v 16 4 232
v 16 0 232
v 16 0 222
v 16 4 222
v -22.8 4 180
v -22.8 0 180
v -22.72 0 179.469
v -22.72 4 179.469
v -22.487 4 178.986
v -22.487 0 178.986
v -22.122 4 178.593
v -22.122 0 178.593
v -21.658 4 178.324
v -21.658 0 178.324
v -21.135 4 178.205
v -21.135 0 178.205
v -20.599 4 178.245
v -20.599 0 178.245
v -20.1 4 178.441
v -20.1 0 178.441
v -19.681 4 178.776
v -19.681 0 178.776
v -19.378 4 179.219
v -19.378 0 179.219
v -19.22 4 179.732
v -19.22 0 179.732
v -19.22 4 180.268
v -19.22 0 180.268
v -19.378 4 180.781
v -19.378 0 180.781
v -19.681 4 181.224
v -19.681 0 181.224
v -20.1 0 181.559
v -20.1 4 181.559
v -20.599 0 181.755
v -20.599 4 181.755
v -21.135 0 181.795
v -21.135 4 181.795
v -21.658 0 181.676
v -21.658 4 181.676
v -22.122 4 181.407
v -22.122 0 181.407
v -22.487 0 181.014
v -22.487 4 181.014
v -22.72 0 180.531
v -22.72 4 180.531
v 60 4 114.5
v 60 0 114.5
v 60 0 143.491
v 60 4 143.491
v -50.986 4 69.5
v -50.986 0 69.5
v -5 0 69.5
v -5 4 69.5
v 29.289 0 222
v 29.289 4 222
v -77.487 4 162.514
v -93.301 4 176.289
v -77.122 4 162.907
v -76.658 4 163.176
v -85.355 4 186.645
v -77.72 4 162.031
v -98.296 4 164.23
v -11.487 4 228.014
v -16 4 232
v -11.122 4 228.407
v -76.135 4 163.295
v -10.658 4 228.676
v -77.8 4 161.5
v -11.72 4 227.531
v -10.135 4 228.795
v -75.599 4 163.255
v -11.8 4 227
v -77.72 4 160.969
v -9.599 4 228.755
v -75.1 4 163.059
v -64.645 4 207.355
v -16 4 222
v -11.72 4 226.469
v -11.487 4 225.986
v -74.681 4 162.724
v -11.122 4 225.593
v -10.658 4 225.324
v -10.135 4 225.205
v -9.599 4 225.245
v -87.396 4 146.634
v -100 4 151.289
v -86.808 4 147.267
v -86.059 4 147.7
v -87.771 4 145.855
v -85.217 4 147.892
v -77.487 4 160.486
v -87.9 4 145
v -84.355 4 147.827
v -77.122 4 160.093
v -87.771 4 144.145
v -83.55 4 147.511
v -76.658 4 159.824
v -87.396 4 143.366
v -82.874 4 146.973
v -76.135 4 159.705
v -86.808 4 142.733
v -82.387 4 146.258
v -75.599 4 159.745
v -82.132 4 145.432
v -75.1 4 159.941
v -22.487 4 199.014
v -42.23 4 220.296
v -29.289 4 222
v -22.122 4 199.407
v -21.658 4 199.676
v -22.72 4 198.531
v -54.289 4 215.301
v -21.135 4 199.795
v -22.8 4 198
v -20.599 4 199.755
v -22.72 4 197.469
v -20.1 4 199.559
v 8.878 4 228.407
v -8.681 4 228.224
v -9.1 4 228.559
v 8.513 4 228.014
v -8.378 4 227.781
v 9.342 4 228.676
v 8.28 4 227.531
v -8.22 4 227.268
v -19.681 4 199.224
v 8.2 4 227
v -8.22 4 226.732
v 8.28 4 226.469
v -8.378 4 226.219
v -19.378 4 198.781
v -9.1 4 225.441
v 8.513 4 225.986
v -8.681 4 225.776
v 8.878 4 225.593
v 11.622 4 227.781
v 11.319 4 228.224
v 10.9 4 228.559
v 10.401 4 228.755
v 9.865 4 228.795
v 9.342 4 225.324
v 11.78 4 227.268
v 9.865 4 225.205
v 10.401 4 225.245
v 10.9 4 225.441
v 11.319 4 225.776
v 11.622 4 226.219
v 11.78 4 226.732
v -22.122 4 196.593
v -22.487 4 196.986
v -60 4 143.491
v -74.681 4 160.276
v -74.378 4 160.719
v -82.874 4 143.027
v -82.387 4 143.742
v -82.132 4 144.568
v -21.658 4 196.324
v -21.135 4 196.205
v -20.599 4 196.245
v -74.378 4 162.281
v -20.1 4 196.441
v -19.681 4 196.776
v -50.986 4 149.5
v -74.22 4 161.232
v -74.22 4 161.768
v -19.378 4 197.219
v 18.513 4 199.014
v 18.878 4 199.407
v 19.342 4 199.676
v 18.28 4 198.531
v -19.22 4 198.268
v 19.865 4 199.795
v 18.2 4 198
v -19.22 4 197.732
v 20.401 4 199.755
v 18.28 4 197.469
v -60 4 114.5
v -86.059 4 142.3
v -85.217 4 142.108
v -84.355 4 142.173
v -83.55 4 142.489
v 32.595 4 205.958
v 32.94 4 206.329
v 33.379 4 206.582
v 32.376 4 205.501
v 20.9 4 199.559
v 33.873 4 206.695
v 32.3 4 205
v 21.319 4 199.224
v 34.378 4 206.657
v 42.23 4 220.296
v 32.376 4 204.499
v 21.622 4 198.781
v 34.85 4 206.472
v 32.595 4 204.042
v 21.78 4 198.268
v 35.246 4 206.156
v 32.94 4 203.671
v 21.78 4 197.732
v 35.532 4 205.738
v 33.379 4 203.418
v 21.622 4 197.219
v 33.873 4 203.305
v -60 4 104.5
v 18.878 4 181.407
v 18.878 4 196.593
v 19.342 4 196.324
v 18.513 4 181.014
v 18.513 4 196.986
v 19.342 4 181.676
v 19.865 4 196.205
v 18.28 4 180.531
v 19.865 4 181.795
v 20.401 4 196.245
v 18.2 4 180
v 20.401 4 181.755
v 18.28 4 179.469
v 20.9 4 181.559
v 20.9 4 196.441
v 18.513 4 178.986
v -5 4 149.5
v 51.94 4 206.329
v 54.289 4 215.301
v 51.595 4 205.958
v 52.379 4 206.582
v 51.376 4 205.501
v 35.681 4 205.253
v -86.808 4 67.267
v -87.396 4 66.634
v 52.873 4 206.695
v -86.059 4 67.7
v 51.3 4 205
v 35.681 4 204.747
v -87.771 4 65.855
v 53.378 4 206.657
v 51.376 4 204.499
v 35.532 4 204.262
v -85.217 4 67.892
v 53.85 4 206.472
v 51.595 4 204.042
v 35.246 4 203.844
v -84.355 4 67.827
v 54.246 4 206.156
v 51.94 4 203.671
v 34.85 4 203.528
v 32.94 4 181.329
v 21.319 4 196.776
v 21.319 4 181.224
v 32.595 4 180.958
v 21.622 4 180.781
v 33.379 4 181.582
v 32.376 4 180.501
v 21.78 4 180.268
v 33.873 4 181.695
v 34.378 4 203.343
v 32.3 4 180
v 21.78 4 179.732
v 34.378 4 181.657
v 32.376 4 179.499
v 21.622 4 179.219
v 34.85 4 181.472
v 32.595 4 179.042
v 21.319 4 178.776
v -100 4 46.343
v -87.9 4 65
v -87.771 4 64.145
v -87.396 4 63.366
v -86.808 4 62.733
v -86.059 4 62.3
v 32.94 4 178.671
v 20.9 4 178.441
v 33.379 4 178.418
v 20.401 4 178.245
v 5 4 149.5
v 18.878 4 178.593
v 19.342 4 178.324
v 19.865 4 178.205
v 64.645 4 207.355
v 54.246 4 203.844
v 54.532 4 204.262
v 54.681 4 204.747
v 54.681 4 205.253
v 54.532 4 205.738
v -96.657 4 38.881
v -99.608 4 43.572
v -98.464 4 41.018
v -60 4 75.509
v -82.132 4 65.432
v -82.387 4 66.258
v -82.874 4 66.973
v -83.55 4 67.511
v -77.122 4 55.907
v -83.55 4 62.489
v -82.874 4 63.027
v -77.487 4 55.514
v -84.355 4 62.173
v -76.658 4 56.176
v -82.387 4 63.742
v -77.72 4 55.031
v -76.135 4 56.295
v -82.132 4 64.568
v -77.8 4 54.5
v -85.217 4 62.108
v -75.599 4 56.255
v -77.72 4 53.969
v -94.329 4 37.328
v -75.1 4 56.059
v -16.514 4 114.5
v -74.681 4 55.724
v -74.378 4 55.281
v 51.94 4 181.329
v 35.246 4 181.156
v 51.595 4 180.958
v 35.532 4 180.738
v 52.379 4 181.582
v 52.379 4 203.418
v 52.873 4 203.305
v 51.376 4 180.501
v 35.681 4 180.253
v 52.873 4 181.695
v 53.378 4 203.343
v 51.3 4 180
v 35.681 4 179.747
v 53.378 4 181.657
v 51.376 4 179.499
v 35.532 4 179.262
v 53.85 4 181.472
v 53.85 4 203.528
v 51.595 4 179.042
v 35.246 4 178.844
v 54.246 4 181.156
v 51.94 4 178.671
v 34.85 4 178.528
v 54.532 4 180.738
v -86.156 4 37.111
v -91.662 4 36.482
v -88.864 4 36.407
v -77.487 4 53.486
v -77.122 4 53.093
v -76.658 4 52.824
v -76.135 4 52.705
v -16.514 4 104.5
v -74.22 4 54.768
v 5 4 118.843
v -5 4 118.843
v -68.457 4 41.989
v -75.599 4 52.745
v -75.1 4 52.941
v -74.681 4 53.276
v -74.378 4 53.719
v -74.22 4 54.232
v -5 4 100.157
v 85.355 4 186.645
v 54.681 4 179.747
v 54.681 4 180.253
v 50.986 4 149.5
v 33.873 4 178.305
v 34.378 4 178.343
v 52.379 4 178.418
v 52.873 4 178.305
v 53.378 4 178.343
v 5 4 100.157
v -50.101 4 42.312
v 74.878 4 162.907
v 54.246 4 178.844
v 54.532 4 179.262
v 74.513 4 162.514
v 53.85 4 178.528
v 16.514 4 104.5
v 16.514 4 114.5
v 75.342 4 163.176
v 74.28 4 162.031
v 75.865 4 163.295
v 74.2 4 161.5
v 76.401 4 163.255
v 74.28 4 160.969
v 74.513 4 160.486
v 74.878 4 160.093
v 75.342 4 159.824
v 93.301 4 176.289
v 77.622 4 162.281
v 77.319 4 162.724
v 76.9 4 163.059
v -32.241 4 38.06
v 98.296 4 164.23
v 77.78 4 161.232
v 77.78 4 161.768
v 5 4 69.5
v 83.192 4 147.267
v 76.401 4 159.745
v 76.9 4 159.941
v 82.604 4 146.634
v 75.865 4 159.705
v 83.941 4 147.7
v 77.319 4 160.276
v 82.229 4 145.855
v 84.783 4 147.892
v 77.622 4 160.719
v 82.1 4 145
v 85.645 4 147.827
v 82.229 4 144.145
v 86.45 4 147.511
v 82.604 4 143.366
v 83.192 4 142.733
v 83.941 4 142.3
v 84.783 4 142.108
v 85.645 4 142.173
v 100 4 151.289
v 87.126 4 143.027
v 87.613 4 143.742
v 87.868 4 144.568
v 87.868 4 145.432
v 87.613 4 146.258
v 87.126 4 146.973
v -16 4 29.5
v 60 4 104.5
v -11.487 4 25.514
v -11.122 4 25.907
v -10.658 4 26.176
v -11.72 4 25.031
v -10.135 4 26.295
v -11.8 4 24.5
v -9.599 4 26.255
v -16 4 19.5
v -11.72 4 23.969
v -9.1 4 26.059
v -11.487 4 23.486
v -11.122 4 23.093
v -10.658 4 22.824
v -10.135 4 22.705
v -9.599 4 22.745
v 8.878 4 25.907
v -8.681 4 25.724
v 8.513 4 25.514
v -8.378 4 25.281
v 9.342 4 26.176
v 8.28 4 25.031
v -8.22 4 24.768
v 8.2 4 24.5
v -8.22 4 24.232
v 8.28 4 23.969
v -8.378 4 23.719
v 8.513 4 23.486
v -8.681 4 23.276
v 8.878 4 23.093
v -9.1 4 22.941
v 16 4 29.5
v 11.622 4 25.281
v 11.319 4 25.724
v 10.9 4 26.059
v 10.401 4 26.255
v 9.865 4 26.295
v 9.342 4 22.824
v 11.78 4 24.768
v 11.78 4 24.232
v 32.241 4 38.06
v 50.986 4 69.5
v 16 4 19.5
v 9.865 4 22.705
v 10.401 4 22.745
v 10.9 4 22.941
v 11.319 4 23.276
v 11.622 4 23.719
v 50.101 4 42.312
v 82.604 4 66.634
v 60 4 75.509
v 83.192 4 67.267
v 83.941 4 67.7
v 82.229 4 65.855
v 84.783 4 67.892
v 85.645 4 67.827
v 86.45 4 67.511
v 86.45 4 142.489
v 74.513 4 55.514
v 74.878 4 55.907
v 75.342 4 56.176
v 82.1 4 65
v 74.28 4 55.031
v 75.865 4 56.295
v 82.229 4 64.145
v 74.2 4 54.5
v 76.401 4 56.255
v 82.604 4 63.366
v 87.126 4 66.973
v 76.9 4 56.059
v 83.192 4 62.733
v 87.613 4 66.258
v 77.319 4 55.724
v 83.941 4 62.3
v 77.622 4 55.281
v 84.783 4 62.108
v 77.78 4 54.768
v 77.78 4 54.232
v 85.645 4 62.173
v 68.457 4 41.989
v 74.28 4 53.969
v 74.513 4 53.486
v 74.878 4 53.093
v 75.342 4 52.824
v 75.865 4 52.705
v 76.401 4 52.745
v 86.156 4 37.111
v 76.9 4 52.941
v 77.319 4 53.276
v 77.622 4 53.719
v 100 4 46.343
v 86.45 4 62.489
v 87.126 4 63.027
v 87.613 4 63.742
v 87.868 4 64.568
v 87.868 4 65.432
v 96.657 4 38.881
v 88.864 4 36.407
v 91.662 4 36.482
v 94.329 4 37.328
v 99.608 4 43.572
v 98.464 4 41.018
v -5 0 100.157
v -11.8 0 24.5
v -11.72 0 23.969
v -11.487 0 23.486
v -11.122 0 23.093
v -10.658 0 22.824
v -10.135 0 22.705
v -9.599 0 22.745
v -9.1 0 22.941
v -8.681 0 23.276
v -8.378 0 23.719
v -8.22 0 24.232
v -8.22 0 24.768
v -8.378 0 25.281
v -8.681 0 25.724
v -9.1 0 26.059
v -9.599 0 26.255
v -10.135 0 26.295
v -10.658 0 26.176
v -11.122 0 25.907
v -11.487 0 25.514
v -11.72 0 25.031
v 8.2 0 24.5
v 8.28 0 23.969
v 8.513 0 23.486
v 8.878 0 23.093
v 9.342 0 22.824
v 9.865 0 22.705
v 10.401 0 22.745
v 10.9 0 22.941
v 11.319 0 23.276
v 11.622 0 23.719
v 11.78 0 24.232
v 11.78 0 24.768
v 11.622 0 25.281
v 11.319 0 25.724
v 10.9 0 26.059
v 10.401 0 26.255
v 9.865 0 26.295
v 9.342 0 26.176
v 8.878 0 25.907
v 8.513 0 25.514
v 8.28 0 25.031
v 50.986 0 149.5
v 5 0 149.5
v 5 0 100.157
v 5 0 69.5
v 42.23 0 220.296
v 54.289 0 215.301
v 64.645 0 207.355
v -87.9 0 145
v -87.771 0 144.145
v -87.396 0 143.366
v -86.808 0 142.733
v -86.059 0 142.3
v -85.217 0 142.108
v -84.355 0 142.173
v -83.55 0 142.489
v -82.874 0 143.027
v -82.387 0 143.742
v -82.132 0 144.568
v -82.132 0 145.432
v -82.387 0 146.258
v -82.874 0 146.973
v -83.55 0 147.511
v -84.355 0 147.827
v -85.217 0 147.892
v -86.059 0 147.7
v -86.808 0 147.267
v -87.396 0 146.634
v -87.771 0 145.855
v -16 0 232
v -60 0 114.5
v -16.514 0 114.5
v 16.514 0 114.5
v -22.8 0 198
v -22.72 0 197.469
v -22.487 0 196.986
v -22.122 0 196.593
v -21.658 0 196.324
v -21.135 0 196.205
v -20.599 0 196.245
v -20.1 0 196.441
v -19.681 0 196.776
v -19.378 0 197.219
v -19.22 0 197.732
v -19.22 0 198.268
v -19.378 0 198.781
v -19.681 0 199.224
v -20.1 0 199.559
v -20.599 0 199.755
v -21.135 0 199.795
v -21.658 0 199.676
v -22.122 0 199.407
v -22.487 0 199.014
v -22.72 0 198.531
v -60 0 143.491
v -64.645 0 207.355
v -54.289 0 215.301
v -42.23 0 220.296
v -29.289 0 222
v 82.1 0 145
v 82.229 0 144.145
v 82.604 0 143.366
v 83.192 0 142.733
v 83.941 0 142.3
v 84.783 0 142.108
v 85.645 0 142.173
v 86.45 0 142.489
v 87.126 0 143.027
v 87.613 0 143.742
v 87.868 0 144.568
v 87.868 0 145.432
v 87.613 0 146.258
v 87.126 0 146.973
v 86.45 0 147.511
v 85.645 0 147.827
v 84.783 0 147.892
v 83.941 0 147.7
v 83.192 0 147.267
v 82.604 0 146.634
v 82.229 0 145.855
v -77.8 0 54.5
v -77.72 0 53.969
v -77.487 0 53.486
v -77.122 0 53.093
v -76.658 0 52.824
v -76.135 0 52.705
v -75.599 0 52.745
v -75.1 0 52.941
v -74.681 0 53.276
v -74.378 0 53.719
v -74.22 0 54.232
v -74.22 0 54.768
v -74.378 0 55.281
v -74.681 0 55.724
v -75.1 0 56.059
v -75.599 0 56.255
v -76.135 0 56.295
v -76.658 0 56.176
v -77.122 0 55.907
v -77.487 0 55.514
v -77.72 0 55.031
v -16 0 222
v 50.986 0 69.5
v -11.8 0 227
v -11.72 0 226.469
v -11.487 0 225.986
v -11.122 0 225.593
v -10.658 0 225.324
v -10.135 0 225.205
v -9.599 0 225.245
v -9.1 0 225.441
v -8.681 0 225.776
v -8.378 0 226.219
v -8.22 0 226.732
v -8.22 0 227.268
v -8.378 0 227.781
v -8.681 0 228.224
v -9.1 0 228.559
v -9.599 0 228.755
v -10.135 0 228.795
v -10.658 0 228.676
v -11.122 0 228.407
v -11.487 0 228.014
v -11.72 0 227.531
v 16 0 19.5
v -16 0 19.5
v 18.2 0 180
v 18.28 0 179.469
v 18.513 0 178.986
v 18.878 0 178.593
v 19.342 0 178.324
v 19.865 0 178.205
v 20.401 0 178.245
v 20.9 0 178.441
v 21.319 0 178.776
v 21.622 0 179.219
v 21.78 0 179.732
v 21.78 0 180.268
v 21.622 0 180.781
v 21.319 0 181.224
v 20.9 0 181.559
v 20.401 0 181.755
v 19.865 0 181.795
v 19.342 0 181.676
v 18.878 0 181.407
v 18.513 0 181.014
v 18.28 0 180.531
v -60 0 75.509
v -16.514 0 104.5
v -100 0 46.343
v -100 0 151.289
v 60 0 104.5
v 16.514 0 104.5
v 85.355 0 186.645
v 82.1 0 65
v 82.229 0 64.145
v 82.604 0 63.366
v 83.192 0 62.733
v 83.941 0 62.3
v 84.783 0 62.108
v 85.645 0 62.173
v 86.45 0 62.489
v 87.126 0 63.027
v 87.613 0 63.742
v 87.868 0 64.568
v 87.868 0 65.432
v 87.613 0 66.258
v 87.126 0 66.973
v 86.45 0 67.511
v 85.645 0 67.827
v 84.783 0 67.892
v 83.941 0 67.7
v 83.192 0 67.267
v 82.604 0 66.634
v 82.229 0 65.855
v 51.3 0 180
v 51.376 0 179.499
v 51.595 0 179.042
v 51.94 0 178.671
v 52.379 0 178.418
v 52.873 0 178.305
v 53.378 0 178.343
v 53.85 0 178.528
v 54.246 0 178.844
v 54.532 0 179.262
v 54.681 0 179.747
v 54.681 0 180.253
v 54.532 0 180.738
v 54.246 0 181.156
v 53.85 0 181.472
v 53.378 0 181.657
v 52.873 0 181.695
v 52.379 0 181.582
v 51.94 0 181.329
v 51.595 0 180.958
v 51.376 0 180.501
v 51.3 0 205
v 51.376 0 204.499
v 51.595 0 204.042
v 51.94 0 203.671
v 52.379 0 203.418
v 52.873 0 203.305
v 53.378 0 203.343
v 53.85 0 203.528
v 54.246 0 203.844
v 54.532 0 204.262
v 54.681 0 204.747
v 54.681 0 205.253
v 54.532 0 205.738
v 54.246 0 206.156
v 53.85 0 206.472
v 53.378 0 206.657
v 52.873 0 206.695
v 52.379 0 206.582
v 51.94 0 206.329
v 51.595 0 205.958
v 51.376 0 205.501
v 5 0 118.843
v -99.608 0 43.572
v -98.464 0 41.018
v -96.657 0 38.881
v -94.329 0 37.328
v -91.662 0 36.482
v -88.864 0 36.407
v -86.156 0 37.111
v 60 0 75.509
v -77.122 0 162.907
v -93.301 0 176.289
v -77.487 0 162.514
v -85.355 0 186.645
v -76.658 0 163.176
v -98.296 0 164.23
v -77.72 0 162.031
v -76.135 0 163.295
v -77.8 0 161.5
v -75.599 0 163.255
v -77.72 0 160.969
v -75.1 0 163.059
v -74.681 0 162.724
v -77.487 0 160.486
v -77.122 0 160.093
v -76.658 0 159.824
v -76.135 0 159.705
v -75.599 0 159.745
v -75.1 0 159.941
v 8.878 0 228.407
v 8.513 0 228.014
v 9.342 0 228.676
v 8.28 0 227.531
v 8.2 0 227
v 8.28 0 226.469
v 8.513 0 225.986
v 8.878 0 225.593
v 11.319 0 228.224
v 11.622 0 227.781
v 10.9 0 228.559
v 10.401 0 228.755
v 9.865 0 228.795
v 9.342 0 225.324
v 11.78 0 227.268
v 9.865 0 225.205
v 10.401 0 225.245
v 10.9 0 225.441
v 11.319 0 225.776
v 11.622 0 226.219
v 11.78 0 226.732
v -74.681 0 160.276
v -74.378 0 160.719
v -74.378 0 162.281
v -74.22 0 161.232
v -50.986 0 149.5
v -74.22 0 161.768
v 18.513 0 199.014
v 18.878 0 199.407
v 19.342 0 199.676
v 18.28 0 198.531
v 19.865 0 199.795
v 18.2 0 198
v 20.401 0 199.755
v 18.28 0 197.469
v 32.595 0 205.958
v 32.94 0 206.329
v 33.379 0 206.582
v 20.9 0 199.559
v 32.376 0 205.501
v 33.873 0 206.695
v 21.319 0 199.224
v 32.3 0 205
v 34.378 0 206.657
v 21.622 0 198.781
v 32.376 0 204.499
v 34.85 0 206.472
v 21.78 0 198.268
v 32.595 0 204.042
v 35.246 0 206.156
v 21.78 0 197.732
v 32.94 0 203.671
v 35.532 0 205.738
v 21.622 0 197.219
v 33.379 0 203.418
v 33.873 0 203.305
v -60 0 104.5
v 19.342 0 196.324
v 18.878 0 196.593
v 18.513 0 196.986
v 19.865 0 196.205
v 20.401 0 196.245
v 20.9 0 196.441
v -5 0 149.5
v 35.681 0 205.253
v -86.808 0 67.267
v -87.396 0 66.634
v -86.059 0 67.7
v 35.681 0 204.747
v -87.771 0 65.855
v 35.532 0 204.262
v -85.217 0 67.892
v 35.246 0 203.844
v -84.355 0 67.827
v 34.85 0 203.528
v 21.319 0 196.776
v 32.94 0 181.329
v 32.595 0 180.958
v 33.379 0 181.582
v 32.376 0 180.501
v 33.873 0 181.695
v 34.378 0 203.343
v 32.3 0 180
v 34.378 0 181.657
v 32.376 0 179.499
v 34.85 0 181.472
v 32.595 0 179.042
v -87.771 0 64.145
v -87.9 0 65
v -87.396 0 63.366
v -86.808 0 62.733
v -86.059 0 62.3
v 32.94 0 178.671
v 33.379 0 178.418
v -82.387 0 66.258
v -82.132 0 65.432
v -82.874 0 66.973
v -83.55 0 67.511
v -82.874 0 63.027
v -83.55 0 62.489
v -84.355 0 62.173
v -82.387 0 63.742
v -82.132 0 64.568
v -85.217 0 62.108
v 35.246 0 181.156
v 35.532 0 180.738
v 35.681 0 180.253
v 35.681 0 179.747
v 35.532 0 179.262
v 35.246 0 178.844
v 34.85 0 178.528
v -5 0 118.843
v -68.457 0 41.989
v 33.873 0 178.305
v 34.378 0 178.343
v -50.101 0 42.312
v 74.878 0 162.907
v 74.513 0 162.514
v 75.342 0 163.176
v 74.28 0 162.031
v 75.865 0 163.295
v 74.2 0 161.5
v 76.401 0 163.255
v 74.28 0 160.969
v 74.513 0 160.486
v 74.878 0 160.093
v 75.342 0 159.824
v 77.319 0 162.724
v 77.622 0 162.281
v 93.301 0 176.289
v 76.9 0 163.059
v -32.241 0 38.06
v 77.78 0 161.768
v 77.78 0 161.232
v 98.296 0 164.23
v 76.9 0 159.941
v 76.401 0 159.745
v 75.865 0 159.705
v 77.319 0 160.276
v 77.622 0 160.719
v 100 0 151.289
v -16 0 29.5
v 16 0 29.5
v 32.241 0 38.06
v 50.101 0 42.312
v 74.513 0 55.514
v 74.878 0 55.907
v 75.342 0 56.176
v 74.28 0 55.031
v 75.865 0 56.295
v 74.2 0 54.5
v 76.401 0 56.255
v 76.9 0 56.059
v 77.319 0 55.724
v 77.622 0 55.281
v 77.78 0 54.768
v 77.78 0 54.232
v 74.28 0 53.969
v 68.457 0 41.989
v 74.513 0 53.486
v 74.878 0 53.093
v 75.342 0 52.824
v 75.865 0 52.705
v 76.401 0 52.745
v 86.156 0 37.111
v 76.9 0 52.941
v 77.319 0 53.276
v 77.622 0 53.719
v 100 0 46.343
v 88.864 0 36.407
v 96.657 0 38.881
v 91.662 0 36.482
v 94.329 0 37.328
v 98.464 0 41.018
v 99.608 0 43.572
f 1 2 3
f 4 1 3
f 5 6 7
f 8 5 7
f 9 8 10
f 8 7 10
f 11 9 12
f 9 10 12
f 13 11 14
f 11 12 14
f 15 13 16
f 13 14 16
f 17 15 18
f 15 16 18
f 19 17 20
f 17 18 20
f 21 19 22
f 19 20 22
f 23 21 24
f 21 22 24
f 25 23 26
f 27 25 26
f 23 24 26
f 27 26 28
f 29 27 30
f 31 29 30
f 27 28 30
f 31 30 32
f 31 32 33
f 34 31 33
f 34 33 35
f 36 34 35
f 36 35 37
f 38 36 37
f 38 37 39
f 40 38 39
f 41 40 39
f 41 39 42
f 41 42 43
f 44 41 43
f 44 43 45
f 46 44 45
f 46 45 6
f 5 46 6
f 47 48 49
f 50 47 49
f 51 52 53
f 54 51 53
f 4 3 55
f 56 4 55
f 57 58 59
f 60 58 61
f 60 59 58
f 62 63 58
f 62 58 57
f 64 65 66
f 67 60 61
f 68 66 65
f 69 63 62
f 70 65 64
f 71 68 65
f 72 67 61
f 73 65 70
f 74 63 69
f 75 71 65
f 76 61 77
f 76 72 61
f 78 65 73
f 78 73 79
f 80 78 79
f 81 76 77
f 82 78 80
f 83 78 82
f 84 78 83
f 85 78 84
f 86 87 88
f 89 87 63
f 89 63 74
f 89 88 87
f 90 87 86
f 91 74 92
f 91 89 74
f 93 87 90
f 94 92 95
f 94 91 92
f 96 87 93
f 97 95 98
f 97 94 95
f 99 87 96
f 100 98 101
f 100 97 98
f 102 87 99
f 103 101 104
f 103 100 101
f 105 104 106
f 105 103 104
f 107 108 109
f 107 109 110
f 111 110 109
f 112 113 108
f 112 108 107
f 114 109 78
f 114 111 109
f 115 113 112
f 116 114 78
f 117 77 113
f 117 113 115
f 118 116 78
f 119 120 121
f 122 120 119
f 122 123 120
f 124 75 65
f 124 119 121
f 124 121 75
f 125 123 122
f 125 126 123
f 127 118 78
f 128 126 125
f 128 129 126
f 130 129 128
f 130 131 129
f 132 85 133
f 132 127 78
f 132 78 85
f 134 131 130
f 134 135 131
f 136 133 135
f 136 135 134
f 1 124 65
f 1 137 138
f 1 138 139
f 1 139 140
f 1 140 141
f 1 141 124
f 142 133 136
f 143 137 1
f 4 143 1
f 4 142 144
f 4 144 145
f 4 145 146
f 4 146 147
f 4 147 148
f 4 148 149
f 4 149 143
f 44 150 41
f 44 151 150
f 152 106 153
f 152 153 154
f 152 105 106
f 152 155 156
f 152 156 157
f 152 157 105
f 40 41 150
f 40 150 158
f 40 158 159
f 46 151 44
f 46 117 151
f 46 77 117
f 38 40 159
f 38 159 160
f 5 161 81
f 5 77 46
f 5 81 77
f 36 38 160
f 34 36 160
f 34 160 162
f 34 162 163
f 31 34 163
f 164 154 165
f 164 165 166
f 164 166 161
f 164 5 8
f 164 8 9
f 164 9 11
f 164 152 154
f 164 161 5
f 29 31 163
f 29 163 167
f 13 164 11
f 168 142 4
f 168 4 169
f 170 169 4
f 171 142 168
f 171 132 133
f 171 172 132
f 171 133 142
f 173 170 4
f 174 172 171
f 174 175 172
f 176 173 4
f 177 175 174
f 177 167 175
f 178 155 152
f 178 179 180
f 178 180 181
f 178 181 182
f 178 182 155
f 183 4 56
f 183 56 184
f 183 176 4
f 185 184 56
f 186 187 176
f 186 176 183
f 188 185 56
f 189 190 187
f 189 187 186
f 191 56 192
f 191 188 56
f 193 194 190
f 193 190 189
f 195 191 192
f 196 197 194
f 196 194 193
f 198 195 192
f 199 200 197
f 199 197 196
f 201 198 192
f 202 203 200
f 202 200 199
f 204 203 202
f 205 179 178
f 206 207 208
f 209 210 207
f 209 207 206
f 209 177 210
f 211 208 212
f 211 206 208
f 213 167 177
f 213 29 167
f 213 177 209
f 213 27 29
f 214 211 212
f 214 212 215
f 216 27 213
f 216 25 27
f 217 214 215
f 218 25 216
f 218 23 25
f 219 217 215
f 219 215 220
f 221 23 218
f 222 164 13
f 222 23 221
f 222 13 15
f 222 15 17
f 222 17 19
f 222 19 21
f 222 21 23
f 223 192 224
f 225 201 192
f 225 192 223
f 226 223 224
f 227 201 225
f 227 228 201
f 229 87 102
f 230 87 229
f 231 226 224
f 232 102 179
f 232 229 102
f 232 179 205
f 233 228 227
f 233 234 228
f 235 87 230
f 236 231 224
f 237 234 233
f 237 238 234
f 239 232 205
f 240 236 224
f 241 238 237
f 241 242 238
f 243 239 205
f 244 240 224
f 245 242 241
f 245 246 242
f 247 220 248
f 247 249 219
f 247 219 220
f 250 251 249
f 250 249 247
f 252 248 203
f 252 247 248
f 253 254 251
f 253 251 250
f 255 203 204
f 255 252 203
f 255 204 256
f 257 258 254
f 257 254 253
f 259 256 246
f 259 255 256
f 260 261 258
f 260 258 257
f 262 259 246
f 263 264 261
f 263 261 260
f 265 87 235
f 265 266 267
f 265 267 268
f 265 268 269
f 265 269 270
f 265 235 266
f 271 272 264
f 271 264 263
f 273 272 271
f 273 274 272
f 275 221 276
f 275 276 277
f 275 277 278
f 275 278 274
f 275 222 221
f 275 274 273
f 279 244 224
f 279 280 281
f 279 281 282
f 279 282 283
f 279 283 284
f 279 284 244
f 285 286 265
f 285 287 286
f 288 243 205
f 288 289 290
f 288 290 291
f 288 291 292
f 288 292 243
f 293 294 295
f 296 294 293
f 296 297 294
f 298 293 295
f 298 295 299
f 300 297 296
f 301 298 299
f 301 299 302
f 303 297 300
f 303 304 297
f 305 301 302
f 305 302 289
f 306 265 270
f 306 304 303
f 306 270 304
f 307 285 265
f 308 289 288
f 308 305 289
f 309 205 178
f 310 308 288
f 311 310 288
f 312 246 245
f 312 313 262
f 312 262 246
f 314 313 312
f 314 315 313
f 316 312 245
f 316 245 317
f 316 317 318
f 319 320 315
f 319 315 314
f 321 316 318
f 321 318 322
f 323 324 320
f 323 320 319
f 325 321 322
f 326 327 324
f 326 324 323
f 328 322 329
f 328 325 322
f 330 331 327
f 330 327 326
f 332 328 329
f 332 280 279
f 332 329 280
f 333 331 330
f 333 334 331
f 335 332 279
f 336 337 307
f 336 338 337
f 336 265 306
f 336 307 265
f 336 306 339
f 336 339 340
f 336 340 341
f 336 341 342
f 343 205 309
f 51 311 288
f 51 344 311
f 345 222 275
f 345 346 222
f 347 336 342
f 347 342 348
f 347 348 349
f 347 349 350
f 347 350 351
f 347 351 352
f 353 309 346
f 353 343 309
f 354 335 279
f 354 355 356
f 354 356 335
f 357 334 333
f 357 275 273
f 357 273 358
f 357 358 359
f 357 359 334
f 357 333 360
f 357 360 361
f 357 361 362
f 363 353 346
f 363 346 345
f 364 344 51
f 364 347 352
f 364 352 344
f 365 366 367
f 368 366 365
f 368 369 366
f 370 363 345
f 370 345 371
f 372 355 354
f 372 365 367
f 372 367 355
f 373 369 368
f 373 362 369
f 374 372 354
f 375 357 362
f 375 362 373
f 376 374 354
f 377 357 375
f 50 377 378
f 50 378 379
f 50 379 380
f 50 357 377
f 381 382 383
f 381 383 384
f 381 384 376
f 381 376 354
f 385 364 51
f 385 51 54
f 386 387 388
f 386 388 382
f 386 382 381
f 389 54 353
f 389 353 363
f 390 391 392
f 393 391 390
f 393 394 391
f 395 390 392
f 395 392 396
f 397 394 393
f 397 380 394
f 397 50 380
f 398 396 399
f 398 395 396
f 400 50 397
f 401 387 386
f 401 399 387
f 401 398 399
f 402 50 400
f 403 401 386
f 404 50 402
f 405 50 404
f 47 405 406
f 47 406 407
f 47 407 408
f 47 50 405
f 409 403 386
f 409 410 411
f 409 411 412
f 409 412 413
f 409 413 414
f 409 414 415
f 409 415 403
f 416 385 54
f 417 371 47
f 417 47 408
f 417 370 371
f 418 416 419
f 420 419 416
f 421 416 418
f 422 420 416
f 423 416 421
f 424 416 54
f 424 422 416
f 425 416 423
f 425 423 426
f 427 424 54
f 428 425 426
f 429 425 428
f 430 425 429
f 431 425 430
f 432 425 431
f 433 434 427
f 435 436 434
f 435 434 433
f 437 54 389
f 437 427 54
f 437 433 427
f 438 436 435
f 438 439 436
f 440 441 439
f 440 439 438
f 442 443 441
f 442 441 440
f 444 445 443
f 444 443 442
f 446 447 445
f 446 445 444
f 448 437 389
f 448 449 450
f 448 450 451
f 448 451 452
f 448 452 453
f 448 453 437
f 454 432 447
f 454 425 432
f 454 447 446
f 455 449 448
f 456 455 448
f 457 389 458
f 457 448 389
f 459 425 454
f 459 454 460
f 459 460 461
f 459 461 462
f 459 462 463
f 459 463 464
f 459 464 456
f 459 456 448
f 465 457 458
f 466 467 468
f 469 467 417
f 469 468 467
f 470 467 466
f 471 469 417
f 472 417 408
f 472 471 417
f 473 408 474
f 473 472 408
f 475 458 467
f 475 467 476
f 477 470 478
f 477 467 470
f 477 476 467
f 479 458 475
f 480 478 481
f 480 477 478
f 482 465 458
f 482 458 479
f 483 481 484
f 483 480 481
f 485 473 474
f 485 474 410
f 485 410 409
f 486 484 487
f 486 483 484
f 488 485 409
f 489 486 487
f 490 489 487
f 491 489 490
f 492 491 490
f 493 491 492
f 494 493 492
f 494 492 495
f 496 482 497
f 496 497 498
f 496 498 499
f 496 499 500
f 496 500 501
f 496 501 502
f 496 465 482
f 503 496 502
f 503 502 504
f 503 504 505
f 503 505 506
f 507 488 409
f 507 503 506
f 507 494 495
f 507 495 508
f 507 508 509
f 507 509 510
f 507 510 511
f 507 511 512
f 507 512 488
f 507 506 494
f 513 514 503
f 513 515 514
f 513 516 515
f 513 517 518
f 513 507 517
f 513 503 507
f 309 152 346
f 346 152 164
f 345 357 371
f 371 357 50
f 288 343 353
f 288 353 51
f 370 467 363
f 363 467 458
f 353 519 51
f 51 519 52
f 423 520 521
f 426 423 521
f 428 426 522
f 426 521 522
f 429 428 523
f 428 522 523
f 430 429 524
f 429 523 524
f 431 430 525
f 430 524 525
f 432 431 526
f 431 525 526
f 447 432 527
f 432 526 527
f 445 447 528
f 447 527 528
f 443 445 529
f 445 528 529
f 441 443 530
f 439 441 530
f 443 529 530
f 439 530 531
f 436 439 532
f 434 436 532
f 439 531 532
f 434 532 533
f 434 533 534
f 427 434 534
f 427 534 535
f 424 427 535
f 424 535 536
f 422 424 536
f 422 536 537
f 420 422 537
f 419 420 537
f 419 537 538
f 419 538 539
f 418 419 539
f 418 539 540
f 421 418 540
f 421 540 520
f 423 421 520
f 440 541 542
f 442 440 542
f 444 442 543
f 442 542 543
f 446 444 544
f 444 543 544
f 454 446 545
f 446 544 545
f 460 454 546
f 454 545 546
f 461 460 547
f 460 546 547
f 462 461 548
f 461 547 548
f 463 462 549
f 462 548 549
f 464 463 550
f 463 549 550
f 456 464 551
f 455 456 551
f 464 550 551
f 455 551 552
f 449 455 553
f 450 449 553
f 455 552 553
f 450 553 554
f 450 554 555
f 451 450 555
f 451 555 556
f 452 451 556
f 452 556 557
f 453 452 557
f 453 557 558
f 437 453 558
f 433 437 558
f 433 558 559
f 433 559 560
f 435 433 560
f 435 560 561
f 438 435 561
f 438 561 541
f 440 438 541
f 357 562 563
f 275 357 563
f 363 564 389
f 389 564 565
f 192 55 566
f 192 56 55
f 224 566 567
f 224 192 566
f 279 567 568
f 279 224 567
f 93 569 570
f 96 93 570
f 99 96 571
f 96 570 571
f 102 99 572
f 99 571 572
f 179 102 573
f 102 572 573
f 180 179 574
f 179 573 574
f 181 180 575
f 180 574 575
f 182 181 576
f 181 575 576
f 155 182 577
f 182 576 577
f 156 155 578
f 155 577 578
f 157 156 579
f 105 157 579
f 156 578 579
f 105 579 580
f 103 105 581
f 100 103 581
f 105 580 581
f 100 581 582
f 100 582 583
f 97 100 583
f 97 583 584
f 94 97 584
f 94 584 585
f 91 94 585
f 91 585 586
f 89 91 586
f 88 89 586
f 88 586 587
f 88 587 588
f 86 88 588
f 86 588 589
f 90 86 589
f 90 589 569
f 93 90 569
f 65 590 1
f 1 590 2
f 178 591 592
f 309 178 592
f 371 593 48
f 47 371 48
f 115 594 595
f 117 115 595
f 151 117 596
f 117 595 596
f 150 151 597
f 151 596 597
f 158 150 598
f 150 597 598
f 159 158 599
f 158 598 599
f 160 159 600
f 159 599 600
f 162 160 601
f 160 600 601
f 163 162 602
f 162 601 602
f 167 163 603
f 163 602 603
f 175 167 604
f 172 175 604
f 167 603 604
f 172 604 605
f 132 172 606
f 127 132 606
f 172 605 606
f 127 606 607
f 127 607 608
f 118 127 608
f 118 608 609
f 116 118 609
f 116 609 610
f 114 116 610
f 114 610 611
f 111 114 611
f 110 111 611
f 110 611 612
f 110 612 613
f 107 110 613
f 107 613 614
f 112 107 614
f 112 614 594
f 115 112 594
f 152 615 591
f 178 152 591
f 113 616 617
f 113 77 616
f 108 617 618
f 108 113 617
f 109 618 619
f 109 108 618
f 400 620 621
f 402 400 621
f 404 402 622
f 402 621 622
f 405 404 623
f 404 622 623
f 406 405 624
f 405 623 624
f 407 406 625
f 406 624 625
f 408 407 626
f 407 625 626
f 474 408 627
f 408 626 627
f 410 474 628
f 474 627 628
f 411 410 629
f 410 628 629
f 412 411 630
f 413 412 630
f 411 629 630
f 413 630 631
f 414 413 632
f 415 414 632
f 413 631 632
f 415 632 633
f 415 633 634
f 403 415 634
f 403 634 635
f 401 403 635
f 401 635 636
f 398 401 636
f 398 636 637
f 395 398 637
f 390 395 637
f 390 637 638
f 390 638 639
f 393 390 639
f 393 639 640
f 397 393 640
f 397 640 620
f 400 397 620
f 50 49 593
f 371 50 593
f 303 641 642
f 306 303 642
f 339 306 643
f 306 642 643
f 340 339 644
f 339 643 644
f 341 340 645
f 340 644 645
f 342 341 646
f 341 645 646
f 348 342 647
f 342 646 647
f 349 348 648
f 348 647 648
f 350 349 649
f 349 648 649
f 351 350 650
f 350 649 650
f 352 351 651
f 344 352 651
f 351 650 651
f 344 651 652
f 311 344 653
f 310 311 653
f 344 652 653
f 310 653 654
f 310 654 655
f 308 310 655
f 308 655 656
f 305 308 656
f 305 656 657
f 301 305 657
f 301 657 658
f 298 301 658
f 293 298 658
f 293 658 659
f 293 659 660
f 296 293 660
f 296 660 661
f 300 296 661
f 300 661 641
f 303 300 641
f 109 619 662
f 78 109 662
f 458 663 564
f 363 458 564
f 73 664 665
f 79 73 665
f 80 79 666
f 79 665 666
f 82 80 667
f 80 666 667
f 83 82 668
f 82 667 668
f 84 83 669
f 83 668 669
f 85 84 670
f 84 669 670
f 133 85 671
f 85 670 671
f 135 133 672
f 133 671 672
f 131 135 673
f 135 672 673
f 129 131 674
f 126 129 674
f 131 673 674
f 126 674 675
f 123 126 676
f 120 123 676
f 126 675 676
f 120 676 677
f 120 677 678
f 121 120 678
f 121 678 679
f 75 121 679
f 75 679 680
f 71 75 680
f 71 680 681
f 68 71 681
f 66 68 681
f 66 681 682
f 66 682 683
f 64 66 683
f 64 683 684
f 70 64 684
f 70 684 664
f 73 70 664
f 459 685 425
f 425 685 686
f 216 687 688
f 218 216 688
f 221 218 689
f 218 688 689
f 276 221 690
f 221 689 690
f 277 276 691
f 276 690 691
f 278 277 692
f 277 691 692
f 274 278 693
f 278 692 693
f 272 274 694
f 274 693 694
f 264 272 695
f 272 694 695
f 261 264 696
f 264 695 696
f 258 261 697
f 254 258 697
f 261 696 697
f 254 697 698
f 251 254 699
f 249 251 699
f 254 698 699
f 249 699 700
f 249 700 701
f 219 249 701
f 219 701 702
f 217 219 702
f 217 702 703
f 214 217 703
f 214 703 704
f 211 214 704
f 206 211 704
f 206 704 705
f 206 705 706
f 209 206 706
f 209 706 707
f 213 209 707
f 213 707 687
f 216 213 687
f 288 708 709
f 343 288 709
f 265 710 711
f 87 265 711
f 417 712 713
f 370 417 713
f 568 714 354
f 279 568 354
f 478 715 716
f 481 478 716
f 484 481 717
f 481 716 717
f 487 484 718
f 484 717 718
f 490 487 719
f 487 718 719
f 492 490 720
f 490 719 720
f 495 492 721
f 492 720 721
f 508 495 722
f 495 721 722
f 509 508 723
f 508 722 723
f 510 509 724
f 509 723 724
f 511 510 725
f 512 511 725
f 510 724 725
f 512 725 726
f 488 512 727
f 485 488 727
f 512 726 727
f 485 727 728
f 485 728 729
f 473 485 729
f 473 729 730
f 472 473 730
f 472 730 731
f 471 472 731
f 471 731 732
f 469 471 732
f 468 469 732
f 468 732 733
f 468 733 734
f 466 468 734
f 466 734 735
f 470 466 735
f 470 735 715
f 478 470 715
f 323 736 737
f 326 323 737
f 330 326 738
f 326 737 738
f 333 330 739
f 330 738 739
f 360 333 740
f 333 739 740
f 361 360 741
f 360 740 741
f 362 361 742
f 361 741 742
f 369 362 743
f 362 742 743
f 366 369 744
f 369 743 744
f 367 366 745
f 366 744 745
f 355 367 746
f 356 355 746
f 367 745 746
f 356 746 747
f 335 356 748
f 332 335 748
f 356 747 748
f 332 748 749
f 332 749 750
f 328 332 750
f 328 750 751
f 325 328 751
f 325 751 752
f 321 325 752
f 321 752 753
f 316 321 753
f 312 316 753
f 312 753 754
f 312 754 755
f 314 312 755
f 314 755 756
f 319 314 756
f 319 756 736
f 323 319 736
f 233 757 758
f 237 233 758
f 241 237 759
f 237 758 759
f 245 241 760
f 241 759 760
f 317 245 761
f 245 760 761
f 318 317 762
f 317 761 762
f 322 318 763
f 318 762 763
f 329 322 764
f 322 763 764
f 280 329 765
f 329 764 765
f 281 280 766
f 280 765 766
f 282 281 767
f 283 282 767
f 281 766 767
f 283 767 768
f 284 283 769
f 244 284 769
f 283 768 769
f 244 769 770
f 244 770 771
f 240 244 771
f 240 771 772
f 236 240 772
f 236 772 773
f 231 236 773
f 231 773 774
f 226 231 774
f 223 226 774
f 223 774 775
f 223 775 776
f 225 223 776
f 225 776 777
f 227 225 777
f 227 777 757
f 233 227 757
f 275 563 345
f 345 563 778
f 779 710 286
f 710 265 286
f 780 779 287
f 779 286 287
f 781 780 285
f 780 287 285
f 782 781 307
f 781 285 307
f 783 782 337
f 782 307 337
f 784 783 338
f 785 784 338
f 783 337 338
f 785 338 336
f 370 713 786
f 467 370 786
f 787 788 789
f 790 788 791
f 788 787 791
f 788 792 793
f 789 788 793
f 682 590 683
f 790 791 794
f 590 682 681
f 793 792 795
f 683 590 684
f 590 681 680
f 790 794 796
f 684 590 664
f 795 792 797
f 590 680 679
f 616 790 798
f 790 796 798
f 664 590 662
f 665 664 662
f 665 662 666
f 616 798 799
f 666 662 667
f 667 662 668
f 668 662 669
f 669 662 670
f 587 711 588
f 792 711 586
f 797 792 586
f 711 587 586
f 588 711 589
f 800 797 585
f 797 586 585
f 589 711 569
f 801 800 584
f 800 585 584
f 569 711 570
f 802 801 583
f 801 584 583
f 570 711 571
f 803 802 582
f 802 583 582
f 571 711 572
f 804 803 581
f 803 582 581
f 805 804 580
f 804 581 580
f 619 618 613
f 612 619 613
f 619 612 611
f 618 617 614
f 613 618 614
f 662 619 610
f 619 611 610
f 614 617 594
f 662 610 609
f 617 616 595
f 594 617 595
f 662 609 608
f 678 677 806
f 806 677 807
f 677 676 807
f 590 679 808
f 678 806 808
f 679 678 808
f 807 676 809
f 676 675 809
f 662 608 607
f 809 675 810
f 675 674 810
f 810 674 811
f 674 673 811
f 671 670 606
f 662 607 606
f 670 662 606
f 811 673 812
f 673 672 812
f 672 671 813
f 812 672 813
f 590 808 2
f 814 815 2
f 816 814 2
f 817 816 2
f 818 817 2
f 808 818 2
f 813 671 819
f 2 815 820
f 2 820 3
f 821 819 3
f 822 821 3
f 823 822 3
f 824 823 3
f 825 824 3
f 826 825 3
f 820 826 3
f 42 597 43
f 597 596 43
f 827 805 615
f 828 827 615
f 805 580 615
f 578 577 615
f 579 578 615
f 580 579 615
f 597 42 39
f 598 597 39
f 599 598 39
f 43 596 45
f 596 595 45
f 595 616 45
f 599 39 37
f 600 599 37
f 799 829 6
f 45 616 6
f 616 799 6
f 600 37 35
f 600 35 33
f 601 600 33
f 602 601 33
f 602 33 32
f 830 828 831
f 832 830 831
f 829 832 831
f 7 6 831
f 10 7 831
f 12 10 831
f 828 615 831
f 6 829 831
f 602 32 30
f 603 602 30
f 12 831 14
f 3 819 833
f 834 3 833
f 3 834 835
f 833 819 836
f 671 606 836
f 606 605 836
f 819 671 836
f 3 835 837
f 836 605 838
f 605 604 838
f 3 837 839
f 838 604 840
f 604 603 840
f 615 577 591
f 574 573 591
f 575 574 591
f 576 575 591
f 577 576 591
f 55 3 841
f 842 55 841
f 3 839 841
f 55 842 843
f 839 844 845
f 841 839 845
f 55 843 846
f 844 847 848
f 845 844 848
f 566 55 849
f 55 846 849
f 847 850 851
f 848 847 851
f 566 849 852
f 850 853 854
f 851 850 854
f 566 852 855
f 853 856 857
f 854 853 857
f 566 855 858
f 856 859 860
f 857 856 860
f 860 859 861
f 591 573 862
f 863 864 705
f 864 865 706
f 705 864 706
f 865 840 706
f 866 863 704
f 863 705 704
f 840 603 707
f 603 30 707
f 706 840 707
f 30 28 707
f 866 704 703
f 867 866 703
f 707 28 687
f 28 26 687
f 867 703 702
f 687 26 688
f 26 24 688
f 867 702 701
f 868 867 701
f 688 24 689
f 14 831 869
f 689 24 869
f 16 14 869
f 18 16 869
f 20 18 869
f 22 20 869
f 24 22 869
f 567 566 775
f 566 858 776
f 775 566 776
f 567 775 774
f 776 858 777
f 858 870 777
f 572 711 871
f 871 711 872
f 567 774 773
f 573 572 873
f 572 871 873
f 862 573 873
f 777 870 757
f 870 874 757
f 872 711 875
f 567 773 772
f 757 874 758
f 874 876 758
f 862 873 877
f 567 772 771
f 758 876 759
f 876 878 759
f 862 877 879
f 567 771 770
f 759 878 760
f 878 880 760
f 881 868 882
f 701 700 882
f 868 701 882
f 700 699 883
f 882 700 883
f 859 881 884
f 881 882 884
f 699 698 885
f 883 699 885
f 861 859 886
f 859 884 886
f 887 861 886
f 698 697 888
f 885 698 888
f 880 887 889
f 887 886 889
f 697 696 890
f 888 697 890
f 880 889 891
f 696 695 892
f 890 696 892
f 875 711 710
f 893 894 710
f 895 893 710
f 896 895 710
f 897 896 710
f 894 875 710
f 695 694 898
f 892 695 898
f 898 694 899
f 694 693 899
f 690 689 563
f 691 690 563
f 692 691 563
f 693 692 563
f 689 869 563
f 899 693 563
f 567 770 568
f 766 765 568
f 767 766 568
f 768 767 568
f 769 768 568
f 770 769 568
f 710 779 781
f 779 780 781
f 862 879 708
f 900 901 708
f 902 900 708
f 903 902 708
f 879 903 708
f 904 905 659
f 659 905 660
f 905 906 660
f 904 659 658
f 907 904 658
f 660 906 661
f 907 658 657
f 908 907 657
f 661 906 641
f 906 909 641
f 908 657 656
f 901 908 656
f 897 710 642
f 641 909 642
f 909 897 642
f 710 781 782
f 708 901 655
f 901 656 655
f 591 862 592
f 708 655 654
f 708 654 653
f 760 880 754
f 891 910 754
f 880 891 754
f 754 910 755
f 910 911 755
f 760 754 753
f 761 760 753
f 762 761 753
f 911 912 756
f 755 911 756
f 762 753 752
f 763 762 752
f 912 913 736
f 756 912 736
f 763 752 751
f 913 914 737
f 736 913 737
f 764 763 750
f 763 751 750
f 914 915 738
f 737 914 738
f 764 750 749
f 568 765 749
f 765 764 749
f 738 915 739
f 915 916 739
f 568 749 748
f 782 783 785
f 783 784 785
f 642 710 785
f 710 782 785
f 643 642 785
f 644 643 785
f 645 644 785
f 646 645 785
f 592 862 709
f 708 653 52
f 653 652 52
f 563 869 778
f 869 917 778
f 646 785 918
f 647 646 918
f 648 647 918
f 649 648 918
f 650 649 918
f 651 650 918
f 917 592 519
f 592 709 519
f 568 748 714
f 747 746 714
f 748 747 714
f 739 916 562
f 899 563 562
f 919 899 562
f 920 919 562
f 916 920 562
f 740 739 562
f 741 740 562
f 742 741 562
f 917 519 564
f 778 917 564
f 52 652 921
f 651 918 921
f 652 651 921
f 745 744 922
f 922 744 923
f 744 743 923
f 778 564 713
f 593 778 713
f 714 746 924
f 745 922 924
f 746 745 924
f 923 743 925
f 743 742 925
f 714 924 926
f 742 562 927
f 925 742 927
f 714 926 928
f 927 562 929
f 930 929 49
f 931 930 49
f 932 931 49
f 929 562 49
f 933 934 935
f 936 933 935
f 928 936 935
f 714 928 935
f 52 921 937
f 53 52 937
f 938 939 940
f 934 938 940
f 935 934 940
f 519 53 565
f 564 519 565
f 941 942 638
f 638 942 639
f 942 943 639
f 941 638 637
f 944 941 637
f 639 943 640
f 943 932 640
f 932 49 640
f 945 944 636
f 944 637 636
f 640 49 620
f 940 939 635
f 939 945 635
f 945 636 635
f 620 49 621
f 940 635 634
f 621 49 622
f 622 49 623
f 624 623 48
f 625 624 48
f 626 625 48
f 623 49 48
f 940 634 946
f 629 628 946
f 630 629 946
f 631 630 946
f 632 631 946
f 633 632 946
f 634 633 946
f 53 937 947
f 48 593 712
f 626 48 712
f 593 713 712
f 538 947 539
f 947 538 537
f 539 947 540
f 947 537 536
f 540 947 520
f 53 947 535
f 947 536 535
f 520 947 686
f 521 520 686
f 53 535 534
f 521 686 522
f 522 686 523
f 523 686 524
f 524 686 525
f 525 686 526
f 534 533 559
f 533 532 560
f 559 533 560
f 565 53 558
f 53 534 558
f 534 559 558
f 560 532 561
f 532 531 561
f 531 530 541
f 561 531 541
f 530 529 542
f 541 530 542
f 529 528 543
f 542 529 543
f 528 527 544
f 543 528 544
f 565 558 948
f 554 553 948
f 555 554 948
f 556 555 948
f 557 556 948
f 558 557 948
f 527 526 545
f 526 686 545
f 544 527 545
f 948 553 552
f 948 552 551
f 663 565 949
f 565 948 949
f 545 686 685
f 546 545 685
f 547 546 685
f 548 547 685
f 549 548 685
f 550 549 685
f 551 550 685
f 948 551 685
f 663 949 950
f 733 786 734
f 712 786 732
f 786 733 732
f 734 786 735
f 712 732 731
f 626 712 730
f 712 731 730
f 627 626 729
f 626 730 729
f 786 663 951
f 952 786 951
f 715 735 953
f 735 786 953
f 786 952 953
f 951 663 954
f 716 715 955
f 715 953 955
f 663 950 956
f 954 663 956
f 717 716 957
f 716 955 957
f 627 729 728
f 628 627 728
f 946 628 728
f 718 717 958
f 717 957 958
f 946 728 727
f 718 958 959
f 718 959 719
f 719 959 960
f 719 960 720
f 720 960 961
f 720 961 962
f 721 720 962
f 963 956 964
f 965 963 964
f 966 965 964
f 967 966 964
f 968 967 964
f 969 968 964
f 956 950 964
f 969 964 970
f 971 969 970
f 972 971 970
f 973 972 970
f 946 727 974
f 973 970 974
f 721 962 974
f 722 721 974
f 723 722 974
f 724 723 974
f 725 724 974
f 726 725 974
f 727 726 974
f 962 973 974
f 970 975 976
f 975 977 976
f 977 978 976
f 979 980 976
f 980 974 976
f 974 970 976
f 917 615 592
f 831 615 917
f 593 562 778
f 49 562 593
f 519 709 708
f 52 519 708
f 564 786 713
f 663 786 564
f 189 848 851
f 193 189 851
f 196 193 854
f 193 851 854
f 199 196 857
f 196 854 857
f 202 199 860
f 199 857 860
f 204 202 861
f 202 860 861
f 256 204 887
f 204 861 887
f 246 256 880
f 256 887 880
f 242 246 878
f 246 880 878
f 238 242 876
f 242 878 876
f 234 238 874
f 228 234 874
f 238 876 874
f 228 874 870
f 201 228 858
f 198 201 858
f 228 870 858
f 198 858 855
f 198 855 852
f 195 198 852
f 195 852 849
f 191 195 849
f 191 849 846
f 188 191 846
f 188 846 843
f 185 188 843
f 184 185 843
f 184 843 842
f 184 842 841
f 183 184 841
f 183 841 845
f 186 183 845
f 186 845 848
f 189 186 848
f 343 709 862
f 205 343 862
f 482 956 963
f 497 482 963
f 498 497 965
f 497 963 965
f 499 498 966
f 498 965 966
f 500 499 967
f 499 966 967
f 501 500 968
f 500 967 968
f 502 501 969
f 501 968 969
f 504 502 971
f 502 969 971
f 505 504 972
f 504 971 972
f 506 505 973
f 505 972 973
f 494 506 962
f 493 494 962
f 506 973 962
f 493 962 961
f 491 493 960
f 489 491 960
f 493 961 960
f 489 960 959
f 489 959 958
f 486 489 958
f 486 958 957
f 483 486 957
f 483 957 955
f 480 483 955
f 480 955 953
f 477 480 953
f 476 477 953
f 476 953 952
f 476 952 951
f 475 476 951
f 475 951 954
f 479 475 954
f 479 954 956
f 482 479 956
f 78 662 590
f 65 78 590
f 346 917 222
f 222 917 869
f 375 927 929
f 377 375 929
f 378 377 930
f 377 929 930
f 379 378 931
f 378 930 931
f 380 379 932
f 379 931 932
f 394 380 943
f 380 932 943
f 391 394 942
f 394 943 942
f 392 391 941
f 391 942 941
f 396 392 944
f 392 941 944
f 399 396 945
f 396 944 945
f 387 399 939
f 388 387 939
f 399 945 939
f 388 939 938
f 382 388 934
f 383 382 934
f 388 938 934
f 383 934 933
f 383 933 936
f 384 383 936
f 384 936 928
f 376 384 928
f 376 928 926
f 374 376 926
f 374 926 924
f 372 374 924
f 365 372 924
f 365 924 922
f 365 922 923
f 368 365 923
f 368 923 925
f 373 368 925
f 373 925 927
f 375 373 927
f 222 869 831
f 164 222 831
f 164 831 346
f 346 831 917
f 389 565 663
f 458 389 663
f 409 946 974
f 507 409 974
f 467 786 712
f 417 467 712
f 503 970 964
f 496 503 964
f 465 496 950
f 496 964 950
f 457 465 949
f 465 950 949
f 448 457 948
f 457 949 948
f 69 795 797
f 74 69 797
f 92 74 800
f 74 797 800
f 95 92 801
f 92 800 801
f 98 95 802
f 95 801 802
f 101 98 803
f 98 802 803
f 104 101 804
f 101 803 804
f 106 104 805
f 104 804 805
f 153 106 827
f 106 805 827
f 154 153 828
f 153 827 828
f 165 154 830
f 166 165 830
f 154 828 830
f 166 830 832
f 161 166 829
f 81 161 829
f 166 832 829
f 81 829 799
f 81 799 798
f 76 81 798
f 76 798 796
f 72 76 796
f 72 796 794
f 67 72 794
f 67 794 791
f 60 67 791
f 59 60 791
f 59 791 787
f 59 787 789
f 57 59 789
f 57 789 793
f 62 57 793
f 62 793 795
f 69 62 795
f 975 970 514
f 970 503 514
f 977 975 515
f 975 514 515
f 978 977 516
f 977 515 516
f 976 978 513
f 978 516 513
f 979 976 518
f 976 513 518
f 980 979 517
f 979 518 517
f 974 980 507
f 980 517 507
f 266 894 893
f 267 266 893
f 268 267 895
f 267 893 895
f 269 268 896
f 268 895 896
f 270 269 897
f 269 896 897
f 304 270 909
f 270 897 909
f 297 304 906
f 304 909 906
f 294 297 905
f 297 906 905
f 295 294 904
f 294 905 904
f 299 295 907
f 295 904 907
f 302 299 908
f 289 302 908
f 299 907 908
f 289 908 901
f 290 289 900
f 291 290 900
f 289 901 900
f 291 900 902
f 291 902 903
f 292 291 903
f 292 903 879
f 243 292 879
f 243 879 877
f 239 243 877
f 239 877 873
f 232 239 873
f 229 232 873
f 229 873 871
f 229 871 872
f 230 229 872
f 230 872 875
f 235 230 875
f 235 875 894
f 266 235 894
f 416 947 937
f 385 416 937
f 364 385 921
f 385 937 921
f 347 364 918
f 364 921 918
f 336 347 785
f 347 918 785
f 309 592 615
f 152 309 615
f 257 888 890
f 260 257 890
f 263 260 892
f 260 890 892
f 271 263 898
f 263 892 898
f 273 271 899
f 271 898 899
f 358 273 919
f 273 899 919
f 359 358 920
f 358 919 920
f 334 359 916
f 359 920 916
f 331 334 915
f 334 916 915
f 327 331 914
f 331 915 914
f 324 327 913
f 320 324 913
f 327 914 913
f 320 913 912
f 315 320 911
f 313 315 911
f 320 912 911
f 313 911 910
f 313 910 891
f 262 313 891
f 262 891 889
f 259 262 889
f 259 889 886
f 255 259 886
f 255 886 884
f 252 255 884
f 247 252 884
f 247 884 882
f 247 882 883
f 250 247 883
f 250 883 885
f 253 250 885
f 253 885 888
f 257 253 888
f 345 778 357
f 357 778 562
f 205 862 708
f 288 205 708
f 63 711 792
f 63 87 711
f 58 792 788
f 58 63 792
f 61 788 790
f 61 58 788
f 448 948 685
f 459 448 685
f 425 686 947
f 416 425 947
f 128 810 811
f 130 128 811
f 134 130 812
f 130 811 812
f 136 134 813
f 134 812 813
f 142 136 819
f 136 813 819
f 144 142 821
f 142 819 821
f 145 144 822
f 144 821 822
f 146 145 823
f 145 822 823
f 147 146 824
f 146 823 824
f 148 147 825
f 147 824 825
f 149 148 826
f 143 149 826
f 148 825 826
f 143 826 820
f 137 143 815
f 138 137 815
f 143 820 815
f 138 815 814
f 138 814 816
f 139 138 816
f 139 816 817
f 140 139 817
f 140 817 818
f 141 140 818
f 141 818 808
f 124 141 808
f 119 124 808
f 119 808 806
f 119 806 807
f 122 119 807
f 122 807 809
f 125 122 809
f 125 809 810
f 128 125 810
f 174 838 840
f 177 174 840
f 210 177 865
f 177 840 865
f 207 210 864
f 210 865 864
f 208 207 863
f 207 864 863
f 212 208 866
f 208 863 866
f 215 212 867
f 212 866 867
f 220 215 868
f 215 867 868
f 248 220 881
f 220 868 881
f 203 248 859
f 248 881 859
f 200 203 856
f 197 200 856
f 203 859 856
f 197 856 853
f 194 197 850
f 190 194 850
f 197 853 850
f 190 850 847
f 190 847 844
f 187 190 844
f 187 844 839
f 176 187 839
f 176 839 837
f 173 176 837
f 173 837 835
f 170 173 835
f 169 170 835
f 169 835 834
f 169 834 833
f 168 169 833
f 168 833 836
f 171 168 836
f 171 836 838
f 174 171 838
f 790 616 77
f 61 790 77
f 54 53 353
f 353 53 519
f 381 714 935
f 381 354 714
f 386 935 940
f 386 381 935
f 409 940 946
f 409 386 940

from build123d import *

# Parameters (mm, degrees)
BOSS_EXTRUDE1_DEPTH      = 4
M5_CLEARANCE_HOLE1_D     = 5.8
FILLET1_R                = 10
M3_CLEARANCE_HOLE1_D     = 3.6
M3_CLEARANCE_HOLE1_DEPTH = 10
M3_CLEARANCE_HOLE1_TIP   = 1.081549114
CHAMFER1_SIZE            = 50
FILLET3_R                = 50
M3_CLEARANCE_HOLE2_D     = 3.6
M3_CLEARANCE_HOLE3_D     = 3.4


with BuildPart() as part:
    # Sketch1 → Boss-Extrude1 (new body)
    with BuildSketch(Plane(origin=(0, 0, 0), x_dir=(1, 0, 0), z_dir=(0, 1, 0))):
        with BuildLine():
            Line((-100, -29.5), (-100, -222))
            Line((-100, -222), (-16, -222))
            Line((-16, -222), (-16, -232))
            Line((-16, -232), (16, -232))
            Line((16, -232), (16, -222))
            Line((16, -222), (100, -222))
            Line((100, -222), (100, -29.5))
            ThreePointArc((100, -29.5), (58, -42.739333694), (16, -29.5))
            Line((16, -29.5), (16, -19.5))
            Line((16, -19.5), (-16, -19.5))
            Line((-16, -19.5), (-16, -29.5))
            ThreePointArc((-16, -29.5), (-58, -42.739333694), (-100, -29.5))
        make_face()
        Polygon((-50.986121811, -69.5), (-5, -69.5), (-5, -100.157414541), align=None, mode=Mode.SUBTRACT)
        Polygon((5, -69.5), (50.986121811, -69.5), (5, -100.157414541), align=None, mode=Mode.SUBTRACT)
        Polygon((60, -75.509252126), (60, -104.5), (16.513878189, -104.5), align=None, mode=Mode.SUBTRACT)
        Polygon((60, -114.5), (60, -143.490747874), (16.513878189, -114.5), align=None, mode=Mode.SUBTRACT)
        Polygon((50.986121811, -149.5), (5, -149.5), (5, -118.842585459), align=None, mode=Mode.SUBTRACT)
        Polygon((-5, -149.5), (-50.986121811, -149.5), (-5, -118.842585459), align=None, mode=Mode.SUBTRACT)
        Polygon((-60, -143.490747874), (-60, -114.5), (-16.513878189, -114.5), align=None, mode=Mode.SUBTRACT)
        Polygon((-16.513878189, -104.5), (-60, -104.5), (-60, -75.509252126), align=None, mode=Mode.SUBTRACT)
    extrude(amount=BOSS_EXTRUDE1_DEPTH)

    # M5 Clearance Hole1 (through all)
    with Locations(Plane(origin=(0, 4, 0), x_dir=(1, 0, 0), z_dir=(0, 1, 0))):
        with Locations((-85, -65), (-85, -145), (85, -145), (85, -65)):
            Hole(M5_CLEARANCE_HOLE1_D / 2)

    # Fillet1
    fillet1_edges = [part.edges().sort_by_distance(p)[0] for p in [
        (100, 2, 29.5),
        (-100, 2, 29.5),
    ]]
    fillet(fillet1_edges, radius=FILLET1_R)

    # M3 Clearance Hole1
    with Locations(Plane(origin=(0, 4, 0), x_dir=(1, 0, 0), z_dir=(0, 1, 0))):
        with Locations((-21, -198), (-21, -180), (20, -180), (20, -198)):
            Hole(M3_CLEARANCE_HOLE1_D / 2, depth=M3_CLEARANCE_HOLE1_DEPTH)
            with Locations((0, 0, -(M3_CLEARANCE_HOLE1_DEPTH + M3_CLEARANCE_HOLE1_TIP / 2))):  # 118° drill point
                Cone(0, M3_CLEARANCE_HOLE1_D / 2, M3_CLEARANCE_HOLE1_TIP, mode=Mode.SUBTRACT)

    # Chamfer1
    chamfer1_edges = [part.edges().sort_by_distance(p)[0] for p in [
        (100, 2, 222),
        (-100, 2, 222),
    ]]
    chamfer(chamfer1_edges, length=CHAMFER1_SIZE)

    # Fillet3
    fillet3_edges = [part.edges().sort_by_distance(p)[0] for p in [
        (100, 2, 172),
        (50, 2, 222),
        (-50, 2, 222),
        (-100, 2, 172),
    ]]
    fillet(fillet3_edges, radius=FILLET3_R)

    # M3 Clearance Hole2 (through all)
    with Locations(Plane(origin=(0, 4, 0), x_dir=(1, 0, 0), z_dir=(0, 1, 0))):
        with Locations((-76, -54.5), (76, -54.5), (76, -161.5), (-76, -161.5), (-10, -24.5), (10, -24.5), (-10, -227), (10, -227)):
            Hole(M3_CLEARANCE_HOLE2_D / 2)

    # M3 Clearance Hole3 (through all)
    with Locations(Plane(origin=(0, 4, 0), x_dir=(1, 0, 0), z_dir=(0, 1, 0))):
        with Locations((53, -180), (34, -180), (34, -205), (53, -205)):
            Hole(M3_CLEARANCE_HOLE3_D / 2)


solid = part.part
